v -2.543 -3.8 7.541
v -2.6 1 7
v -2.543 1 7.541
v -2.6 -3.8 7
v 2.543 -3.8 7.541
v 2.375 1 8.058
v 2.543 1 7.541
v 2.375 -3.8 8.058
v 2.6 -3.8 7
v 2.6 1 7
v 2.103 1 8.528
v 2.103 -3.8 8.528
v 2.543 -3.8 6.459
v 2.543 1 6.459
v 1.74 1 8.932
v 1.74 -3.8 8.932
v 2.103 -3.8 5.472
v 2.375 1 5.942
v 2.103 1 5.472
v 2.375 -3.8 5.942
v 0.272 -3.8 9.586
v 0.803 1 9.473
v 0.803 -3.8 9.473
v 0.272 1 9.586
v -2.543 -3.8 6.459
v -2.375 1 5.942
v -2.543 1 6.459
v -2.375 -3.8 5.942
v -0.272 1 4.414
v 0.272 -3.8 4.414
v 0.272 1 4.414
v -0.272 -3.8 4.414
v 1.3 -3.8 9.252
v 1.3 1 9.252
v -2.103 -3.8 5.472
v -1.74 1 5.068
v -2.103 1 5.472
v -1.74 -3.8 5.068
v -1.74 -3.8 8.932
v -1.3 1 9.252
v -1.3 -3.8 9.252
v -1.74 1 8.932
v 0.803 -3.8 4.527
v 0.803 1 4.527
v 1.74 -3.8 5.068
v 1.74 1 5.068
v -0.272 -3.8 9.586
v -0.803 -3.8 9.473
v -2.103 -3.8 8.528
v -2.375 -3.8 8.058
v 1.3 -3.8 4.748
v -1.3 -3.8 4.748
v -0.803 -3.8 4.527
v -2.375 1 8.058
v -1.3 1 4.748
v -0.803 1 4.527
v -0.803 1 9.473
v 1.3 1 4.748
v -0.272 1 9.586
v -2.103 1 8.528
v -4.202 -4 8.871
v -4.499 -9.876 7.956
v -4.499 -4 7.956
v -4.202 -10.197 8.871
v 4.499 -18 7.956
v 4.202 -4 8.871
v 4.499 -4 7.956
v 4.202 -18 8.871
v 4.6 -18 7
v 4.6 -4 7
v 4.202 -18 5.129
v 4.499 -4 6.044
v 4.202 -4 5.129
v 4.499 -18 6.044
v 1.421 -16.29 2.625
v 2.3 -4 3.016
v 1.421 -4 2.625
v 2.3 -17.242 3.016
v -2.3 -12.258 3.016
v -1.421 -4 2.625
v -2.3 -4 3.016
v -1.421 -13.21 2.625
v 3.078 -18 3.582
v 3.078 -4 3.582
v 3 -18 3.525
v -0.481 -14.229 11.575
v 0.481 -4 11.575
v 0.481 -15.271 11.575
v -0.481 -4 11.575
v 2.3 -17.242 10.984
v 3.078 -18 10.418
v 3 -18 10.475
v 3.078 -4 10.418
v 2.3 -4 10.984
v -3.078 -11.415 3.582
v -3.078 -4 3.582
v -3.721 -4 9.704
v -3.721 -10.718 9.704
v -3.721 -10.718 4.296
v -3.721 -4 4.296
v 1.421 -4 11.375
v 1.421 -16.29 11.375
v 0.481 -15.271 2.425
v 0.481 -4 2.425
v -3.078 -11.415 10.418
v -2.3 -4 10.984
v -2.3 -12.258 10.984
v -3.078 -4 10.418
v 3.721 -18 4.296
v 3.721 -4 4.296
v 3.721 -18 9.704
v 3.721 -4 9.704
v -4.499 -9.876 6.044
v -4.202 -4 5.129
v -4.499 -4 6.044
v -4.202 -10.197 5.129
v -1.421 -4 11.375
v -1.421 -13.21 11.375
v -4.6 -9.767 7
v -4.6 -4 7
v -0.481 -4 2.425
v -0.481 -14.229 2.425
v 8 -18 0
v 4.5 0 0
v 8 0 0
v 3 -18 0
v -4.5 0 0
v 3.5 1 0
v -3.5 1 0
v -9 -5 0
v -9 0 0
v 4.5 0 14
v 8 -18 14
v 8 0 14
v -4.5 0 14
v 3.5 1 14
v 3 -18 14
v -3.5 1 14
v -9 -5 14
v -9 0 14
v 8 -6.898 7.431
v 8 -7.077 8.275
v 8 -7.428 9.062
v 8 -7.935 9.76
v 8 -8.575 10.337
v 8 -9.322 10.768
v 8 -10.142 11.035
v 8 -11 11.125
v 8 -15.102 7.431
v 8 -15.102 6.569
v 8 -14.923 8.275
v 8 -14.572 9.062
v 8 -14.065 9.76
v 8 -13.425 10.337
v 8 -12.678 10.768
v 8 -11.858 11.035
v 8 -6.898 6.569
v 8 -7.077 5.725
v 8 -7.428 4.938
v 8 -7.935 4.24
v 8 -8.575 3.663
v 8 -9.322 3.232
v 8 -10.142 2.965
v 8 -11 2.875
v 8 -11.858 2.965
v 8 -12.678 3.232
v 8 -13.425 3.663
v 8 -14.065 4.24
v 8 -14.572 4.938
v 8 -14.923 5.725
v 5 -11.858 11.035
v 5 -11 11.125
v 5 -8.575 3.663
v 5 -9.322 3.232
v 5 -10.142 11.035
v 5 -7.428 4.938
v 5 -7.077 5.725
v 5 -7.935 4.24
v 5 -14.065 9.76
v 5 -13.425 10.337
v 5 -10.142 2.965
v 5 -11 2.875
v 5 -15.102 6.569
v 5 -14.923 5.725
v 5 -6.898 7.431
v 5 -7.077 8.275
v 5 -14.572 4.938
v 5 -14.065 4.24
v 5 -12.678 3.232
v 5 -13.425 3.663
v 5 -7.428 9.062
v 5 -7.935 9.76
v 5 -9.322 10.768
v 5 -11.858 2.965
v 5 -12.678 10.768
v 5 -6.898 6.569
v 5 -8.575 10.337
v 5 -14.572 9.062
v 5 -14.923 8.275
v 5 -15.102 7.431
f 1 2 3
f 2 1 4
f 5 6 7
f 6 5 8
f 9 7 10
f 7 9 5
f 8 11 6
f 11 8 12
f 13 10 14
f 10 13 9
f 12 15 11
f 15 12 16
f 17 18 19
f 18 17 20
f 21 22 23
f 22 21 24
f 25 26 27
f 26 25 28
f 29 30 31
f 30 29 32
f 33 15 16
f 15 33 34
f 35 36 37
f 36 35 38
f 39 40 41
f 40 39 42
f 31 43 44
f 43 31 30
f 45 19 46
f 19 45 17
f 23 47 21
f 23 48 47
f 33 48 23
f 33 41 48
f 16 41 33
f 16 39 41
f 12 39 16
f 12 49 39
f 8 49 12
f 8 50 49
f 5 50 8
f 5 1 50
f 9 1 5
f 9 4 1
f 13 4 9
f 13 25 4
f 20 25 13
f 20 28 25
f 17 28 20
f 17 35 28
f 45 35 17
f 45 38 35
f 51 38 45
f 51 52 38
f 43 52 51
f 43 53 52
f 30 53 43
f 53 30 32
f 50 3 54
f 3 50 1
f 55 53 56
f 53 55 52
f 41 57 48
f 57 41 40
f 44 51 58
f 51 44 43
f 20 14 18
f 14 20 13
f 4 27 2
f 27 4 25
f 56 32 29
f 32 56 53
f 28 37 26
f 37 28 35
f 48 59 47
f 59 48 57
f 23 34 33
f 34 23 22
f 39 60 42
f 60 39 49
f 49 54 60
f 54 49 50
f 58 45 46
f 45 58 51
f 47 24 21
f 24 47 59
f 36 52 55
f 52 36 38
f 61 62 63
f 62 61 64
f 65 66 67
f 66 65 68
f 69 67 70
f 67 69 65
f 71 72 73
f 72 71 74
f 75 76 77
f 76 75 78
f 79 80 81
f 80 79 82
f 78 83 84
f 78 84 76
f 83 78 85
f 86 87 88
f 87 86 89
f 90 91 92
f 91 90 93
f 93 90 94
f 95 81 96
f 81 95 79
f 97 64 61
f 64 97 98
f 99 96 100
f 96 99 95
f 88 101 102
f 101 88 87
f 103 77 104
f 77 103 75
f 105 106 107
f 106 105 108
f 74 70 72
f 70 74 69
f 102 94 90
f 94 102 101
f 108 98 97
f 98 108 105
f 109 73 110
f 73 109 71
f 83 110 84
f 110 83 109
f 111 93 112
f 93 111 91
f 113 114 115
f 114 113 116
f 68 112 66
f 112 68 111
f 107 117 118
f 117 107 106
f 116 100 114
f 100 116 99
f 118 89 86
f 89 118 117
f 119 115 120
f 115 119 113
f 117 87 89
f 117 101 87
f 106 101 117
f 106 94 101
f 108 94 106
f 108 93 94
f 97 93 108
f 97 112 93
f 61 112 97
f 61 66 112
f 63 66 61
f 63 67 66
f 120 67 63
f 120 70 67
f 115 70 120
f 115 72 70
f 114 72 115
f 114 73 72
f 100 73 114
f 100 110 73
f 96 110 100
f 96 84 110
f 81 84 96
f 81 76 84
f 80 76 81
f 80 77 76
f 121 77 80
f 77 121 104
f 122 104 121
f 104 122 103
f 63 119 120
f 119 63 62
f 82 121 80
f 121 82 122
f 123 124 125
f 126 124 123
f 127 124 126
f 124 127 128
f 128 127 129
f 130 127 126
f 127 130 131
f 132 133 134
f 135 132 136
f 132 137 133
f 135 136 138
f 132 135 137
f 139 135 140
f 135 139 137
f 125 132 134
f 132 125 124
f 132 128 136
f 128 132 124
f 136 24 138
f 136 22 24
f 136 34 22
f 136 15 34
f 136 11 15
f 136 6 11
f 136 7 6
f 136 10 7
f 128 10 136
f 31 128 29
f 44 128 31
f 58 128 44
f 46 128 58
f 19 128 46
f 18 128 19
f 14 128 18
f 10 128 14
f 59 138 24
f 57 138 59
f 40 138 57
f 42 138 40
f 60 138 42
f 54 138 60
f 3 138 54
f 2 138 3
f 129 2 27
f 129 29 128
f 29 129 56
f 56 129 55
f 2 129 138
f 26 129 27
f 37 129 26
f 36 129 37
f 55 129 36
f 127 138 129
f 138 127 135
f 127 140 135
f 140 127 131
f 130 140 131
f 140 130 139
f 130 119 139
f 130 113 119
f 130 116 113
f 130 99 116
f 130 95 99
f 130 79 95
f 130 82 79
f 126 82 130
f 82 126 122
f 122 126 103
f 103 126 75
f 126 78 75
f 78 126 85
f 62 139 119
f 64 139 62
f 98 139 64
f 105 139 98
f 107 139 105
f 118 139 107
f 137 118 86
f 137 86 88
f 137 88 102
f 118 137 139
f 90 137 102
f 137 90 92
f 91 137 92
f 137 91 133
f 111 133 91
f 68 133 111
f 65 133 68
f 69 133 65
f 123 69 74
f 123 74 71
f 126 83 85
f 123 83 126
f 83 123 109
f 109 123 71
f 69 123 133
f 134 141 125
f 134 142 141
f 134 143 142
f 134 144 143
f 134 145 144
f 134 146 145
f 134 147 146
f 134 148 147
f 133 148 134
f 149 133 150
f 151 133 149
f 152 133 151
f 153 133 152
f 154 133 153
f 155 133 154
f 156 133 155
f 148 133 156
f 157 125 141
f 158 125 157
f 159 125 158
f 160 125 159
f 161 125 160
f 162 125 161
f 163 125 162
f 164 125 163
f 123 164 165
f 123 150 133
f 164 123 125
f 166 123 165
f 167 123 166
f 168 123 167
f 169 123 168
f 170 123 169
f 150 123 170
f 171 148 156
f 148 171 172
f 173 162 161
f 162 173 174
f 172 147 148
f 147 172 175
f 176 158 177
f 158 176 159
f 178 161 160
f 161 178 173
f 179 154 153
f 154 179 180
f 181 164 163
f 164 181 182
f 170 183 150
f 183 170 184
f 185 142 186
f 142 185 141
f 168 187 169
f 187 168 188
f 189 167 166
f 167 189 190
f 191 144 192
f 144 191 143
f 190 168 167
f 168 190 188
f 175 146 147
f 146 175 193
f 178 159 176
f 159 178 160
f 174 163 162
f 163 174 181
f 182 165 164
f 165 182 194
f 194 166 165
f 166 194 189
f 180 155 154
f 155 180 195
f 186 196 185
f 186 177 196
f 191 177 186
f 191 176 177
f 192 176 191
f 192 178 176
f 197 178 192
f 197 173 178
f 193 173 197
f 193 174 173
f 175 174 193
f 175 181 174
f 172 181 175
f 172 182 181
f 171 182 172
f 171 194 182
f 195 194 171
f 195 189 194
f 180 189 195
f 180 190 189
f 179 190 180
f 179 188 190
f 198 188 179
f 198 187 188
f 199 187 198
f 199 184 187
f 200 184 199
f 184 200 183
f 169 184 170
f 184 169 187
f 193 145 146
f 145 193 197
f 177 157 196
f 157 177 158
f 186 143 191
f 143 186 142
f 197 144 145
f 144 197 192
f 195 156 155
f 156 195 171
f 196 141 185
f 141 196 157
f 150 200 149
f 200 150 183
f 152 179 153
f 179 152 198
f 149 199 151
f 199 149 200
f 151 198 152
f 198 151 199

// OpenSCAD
magDia = 8.25; /* incl. slop */
magDep = 3;
partHt = 14;
outerWallThick = 8; /* this is how far we go from center towards outside
                       of the printer */


difference() {
   linear_extrude(height=partHt) {
      polygon(points=[[-9,0],[-4.5,0],[-3.5,1],[3.5,1],[4.5,0],
                      [outerWallThick,0], [outerWallThick,-18],
                      [3,-18],[-9,-5]]);
   }

   /* magnet */
   translate([outerWallThick-magDep,-11,partHt/2]) rotate([0,90,0])
      cylinder($fn=30, d=magDia, h=20);

   /* bolt */
   translate([0,-4,partHt/2]) rotate([90,0,0])
      capBoltHole();
}

module capBoltHole() {
   translate([0,0,-20.2]) cylinder($fn=30,d=5.2,h=20);
   cylinder($fn=30,d=9.2,h=20);
}
